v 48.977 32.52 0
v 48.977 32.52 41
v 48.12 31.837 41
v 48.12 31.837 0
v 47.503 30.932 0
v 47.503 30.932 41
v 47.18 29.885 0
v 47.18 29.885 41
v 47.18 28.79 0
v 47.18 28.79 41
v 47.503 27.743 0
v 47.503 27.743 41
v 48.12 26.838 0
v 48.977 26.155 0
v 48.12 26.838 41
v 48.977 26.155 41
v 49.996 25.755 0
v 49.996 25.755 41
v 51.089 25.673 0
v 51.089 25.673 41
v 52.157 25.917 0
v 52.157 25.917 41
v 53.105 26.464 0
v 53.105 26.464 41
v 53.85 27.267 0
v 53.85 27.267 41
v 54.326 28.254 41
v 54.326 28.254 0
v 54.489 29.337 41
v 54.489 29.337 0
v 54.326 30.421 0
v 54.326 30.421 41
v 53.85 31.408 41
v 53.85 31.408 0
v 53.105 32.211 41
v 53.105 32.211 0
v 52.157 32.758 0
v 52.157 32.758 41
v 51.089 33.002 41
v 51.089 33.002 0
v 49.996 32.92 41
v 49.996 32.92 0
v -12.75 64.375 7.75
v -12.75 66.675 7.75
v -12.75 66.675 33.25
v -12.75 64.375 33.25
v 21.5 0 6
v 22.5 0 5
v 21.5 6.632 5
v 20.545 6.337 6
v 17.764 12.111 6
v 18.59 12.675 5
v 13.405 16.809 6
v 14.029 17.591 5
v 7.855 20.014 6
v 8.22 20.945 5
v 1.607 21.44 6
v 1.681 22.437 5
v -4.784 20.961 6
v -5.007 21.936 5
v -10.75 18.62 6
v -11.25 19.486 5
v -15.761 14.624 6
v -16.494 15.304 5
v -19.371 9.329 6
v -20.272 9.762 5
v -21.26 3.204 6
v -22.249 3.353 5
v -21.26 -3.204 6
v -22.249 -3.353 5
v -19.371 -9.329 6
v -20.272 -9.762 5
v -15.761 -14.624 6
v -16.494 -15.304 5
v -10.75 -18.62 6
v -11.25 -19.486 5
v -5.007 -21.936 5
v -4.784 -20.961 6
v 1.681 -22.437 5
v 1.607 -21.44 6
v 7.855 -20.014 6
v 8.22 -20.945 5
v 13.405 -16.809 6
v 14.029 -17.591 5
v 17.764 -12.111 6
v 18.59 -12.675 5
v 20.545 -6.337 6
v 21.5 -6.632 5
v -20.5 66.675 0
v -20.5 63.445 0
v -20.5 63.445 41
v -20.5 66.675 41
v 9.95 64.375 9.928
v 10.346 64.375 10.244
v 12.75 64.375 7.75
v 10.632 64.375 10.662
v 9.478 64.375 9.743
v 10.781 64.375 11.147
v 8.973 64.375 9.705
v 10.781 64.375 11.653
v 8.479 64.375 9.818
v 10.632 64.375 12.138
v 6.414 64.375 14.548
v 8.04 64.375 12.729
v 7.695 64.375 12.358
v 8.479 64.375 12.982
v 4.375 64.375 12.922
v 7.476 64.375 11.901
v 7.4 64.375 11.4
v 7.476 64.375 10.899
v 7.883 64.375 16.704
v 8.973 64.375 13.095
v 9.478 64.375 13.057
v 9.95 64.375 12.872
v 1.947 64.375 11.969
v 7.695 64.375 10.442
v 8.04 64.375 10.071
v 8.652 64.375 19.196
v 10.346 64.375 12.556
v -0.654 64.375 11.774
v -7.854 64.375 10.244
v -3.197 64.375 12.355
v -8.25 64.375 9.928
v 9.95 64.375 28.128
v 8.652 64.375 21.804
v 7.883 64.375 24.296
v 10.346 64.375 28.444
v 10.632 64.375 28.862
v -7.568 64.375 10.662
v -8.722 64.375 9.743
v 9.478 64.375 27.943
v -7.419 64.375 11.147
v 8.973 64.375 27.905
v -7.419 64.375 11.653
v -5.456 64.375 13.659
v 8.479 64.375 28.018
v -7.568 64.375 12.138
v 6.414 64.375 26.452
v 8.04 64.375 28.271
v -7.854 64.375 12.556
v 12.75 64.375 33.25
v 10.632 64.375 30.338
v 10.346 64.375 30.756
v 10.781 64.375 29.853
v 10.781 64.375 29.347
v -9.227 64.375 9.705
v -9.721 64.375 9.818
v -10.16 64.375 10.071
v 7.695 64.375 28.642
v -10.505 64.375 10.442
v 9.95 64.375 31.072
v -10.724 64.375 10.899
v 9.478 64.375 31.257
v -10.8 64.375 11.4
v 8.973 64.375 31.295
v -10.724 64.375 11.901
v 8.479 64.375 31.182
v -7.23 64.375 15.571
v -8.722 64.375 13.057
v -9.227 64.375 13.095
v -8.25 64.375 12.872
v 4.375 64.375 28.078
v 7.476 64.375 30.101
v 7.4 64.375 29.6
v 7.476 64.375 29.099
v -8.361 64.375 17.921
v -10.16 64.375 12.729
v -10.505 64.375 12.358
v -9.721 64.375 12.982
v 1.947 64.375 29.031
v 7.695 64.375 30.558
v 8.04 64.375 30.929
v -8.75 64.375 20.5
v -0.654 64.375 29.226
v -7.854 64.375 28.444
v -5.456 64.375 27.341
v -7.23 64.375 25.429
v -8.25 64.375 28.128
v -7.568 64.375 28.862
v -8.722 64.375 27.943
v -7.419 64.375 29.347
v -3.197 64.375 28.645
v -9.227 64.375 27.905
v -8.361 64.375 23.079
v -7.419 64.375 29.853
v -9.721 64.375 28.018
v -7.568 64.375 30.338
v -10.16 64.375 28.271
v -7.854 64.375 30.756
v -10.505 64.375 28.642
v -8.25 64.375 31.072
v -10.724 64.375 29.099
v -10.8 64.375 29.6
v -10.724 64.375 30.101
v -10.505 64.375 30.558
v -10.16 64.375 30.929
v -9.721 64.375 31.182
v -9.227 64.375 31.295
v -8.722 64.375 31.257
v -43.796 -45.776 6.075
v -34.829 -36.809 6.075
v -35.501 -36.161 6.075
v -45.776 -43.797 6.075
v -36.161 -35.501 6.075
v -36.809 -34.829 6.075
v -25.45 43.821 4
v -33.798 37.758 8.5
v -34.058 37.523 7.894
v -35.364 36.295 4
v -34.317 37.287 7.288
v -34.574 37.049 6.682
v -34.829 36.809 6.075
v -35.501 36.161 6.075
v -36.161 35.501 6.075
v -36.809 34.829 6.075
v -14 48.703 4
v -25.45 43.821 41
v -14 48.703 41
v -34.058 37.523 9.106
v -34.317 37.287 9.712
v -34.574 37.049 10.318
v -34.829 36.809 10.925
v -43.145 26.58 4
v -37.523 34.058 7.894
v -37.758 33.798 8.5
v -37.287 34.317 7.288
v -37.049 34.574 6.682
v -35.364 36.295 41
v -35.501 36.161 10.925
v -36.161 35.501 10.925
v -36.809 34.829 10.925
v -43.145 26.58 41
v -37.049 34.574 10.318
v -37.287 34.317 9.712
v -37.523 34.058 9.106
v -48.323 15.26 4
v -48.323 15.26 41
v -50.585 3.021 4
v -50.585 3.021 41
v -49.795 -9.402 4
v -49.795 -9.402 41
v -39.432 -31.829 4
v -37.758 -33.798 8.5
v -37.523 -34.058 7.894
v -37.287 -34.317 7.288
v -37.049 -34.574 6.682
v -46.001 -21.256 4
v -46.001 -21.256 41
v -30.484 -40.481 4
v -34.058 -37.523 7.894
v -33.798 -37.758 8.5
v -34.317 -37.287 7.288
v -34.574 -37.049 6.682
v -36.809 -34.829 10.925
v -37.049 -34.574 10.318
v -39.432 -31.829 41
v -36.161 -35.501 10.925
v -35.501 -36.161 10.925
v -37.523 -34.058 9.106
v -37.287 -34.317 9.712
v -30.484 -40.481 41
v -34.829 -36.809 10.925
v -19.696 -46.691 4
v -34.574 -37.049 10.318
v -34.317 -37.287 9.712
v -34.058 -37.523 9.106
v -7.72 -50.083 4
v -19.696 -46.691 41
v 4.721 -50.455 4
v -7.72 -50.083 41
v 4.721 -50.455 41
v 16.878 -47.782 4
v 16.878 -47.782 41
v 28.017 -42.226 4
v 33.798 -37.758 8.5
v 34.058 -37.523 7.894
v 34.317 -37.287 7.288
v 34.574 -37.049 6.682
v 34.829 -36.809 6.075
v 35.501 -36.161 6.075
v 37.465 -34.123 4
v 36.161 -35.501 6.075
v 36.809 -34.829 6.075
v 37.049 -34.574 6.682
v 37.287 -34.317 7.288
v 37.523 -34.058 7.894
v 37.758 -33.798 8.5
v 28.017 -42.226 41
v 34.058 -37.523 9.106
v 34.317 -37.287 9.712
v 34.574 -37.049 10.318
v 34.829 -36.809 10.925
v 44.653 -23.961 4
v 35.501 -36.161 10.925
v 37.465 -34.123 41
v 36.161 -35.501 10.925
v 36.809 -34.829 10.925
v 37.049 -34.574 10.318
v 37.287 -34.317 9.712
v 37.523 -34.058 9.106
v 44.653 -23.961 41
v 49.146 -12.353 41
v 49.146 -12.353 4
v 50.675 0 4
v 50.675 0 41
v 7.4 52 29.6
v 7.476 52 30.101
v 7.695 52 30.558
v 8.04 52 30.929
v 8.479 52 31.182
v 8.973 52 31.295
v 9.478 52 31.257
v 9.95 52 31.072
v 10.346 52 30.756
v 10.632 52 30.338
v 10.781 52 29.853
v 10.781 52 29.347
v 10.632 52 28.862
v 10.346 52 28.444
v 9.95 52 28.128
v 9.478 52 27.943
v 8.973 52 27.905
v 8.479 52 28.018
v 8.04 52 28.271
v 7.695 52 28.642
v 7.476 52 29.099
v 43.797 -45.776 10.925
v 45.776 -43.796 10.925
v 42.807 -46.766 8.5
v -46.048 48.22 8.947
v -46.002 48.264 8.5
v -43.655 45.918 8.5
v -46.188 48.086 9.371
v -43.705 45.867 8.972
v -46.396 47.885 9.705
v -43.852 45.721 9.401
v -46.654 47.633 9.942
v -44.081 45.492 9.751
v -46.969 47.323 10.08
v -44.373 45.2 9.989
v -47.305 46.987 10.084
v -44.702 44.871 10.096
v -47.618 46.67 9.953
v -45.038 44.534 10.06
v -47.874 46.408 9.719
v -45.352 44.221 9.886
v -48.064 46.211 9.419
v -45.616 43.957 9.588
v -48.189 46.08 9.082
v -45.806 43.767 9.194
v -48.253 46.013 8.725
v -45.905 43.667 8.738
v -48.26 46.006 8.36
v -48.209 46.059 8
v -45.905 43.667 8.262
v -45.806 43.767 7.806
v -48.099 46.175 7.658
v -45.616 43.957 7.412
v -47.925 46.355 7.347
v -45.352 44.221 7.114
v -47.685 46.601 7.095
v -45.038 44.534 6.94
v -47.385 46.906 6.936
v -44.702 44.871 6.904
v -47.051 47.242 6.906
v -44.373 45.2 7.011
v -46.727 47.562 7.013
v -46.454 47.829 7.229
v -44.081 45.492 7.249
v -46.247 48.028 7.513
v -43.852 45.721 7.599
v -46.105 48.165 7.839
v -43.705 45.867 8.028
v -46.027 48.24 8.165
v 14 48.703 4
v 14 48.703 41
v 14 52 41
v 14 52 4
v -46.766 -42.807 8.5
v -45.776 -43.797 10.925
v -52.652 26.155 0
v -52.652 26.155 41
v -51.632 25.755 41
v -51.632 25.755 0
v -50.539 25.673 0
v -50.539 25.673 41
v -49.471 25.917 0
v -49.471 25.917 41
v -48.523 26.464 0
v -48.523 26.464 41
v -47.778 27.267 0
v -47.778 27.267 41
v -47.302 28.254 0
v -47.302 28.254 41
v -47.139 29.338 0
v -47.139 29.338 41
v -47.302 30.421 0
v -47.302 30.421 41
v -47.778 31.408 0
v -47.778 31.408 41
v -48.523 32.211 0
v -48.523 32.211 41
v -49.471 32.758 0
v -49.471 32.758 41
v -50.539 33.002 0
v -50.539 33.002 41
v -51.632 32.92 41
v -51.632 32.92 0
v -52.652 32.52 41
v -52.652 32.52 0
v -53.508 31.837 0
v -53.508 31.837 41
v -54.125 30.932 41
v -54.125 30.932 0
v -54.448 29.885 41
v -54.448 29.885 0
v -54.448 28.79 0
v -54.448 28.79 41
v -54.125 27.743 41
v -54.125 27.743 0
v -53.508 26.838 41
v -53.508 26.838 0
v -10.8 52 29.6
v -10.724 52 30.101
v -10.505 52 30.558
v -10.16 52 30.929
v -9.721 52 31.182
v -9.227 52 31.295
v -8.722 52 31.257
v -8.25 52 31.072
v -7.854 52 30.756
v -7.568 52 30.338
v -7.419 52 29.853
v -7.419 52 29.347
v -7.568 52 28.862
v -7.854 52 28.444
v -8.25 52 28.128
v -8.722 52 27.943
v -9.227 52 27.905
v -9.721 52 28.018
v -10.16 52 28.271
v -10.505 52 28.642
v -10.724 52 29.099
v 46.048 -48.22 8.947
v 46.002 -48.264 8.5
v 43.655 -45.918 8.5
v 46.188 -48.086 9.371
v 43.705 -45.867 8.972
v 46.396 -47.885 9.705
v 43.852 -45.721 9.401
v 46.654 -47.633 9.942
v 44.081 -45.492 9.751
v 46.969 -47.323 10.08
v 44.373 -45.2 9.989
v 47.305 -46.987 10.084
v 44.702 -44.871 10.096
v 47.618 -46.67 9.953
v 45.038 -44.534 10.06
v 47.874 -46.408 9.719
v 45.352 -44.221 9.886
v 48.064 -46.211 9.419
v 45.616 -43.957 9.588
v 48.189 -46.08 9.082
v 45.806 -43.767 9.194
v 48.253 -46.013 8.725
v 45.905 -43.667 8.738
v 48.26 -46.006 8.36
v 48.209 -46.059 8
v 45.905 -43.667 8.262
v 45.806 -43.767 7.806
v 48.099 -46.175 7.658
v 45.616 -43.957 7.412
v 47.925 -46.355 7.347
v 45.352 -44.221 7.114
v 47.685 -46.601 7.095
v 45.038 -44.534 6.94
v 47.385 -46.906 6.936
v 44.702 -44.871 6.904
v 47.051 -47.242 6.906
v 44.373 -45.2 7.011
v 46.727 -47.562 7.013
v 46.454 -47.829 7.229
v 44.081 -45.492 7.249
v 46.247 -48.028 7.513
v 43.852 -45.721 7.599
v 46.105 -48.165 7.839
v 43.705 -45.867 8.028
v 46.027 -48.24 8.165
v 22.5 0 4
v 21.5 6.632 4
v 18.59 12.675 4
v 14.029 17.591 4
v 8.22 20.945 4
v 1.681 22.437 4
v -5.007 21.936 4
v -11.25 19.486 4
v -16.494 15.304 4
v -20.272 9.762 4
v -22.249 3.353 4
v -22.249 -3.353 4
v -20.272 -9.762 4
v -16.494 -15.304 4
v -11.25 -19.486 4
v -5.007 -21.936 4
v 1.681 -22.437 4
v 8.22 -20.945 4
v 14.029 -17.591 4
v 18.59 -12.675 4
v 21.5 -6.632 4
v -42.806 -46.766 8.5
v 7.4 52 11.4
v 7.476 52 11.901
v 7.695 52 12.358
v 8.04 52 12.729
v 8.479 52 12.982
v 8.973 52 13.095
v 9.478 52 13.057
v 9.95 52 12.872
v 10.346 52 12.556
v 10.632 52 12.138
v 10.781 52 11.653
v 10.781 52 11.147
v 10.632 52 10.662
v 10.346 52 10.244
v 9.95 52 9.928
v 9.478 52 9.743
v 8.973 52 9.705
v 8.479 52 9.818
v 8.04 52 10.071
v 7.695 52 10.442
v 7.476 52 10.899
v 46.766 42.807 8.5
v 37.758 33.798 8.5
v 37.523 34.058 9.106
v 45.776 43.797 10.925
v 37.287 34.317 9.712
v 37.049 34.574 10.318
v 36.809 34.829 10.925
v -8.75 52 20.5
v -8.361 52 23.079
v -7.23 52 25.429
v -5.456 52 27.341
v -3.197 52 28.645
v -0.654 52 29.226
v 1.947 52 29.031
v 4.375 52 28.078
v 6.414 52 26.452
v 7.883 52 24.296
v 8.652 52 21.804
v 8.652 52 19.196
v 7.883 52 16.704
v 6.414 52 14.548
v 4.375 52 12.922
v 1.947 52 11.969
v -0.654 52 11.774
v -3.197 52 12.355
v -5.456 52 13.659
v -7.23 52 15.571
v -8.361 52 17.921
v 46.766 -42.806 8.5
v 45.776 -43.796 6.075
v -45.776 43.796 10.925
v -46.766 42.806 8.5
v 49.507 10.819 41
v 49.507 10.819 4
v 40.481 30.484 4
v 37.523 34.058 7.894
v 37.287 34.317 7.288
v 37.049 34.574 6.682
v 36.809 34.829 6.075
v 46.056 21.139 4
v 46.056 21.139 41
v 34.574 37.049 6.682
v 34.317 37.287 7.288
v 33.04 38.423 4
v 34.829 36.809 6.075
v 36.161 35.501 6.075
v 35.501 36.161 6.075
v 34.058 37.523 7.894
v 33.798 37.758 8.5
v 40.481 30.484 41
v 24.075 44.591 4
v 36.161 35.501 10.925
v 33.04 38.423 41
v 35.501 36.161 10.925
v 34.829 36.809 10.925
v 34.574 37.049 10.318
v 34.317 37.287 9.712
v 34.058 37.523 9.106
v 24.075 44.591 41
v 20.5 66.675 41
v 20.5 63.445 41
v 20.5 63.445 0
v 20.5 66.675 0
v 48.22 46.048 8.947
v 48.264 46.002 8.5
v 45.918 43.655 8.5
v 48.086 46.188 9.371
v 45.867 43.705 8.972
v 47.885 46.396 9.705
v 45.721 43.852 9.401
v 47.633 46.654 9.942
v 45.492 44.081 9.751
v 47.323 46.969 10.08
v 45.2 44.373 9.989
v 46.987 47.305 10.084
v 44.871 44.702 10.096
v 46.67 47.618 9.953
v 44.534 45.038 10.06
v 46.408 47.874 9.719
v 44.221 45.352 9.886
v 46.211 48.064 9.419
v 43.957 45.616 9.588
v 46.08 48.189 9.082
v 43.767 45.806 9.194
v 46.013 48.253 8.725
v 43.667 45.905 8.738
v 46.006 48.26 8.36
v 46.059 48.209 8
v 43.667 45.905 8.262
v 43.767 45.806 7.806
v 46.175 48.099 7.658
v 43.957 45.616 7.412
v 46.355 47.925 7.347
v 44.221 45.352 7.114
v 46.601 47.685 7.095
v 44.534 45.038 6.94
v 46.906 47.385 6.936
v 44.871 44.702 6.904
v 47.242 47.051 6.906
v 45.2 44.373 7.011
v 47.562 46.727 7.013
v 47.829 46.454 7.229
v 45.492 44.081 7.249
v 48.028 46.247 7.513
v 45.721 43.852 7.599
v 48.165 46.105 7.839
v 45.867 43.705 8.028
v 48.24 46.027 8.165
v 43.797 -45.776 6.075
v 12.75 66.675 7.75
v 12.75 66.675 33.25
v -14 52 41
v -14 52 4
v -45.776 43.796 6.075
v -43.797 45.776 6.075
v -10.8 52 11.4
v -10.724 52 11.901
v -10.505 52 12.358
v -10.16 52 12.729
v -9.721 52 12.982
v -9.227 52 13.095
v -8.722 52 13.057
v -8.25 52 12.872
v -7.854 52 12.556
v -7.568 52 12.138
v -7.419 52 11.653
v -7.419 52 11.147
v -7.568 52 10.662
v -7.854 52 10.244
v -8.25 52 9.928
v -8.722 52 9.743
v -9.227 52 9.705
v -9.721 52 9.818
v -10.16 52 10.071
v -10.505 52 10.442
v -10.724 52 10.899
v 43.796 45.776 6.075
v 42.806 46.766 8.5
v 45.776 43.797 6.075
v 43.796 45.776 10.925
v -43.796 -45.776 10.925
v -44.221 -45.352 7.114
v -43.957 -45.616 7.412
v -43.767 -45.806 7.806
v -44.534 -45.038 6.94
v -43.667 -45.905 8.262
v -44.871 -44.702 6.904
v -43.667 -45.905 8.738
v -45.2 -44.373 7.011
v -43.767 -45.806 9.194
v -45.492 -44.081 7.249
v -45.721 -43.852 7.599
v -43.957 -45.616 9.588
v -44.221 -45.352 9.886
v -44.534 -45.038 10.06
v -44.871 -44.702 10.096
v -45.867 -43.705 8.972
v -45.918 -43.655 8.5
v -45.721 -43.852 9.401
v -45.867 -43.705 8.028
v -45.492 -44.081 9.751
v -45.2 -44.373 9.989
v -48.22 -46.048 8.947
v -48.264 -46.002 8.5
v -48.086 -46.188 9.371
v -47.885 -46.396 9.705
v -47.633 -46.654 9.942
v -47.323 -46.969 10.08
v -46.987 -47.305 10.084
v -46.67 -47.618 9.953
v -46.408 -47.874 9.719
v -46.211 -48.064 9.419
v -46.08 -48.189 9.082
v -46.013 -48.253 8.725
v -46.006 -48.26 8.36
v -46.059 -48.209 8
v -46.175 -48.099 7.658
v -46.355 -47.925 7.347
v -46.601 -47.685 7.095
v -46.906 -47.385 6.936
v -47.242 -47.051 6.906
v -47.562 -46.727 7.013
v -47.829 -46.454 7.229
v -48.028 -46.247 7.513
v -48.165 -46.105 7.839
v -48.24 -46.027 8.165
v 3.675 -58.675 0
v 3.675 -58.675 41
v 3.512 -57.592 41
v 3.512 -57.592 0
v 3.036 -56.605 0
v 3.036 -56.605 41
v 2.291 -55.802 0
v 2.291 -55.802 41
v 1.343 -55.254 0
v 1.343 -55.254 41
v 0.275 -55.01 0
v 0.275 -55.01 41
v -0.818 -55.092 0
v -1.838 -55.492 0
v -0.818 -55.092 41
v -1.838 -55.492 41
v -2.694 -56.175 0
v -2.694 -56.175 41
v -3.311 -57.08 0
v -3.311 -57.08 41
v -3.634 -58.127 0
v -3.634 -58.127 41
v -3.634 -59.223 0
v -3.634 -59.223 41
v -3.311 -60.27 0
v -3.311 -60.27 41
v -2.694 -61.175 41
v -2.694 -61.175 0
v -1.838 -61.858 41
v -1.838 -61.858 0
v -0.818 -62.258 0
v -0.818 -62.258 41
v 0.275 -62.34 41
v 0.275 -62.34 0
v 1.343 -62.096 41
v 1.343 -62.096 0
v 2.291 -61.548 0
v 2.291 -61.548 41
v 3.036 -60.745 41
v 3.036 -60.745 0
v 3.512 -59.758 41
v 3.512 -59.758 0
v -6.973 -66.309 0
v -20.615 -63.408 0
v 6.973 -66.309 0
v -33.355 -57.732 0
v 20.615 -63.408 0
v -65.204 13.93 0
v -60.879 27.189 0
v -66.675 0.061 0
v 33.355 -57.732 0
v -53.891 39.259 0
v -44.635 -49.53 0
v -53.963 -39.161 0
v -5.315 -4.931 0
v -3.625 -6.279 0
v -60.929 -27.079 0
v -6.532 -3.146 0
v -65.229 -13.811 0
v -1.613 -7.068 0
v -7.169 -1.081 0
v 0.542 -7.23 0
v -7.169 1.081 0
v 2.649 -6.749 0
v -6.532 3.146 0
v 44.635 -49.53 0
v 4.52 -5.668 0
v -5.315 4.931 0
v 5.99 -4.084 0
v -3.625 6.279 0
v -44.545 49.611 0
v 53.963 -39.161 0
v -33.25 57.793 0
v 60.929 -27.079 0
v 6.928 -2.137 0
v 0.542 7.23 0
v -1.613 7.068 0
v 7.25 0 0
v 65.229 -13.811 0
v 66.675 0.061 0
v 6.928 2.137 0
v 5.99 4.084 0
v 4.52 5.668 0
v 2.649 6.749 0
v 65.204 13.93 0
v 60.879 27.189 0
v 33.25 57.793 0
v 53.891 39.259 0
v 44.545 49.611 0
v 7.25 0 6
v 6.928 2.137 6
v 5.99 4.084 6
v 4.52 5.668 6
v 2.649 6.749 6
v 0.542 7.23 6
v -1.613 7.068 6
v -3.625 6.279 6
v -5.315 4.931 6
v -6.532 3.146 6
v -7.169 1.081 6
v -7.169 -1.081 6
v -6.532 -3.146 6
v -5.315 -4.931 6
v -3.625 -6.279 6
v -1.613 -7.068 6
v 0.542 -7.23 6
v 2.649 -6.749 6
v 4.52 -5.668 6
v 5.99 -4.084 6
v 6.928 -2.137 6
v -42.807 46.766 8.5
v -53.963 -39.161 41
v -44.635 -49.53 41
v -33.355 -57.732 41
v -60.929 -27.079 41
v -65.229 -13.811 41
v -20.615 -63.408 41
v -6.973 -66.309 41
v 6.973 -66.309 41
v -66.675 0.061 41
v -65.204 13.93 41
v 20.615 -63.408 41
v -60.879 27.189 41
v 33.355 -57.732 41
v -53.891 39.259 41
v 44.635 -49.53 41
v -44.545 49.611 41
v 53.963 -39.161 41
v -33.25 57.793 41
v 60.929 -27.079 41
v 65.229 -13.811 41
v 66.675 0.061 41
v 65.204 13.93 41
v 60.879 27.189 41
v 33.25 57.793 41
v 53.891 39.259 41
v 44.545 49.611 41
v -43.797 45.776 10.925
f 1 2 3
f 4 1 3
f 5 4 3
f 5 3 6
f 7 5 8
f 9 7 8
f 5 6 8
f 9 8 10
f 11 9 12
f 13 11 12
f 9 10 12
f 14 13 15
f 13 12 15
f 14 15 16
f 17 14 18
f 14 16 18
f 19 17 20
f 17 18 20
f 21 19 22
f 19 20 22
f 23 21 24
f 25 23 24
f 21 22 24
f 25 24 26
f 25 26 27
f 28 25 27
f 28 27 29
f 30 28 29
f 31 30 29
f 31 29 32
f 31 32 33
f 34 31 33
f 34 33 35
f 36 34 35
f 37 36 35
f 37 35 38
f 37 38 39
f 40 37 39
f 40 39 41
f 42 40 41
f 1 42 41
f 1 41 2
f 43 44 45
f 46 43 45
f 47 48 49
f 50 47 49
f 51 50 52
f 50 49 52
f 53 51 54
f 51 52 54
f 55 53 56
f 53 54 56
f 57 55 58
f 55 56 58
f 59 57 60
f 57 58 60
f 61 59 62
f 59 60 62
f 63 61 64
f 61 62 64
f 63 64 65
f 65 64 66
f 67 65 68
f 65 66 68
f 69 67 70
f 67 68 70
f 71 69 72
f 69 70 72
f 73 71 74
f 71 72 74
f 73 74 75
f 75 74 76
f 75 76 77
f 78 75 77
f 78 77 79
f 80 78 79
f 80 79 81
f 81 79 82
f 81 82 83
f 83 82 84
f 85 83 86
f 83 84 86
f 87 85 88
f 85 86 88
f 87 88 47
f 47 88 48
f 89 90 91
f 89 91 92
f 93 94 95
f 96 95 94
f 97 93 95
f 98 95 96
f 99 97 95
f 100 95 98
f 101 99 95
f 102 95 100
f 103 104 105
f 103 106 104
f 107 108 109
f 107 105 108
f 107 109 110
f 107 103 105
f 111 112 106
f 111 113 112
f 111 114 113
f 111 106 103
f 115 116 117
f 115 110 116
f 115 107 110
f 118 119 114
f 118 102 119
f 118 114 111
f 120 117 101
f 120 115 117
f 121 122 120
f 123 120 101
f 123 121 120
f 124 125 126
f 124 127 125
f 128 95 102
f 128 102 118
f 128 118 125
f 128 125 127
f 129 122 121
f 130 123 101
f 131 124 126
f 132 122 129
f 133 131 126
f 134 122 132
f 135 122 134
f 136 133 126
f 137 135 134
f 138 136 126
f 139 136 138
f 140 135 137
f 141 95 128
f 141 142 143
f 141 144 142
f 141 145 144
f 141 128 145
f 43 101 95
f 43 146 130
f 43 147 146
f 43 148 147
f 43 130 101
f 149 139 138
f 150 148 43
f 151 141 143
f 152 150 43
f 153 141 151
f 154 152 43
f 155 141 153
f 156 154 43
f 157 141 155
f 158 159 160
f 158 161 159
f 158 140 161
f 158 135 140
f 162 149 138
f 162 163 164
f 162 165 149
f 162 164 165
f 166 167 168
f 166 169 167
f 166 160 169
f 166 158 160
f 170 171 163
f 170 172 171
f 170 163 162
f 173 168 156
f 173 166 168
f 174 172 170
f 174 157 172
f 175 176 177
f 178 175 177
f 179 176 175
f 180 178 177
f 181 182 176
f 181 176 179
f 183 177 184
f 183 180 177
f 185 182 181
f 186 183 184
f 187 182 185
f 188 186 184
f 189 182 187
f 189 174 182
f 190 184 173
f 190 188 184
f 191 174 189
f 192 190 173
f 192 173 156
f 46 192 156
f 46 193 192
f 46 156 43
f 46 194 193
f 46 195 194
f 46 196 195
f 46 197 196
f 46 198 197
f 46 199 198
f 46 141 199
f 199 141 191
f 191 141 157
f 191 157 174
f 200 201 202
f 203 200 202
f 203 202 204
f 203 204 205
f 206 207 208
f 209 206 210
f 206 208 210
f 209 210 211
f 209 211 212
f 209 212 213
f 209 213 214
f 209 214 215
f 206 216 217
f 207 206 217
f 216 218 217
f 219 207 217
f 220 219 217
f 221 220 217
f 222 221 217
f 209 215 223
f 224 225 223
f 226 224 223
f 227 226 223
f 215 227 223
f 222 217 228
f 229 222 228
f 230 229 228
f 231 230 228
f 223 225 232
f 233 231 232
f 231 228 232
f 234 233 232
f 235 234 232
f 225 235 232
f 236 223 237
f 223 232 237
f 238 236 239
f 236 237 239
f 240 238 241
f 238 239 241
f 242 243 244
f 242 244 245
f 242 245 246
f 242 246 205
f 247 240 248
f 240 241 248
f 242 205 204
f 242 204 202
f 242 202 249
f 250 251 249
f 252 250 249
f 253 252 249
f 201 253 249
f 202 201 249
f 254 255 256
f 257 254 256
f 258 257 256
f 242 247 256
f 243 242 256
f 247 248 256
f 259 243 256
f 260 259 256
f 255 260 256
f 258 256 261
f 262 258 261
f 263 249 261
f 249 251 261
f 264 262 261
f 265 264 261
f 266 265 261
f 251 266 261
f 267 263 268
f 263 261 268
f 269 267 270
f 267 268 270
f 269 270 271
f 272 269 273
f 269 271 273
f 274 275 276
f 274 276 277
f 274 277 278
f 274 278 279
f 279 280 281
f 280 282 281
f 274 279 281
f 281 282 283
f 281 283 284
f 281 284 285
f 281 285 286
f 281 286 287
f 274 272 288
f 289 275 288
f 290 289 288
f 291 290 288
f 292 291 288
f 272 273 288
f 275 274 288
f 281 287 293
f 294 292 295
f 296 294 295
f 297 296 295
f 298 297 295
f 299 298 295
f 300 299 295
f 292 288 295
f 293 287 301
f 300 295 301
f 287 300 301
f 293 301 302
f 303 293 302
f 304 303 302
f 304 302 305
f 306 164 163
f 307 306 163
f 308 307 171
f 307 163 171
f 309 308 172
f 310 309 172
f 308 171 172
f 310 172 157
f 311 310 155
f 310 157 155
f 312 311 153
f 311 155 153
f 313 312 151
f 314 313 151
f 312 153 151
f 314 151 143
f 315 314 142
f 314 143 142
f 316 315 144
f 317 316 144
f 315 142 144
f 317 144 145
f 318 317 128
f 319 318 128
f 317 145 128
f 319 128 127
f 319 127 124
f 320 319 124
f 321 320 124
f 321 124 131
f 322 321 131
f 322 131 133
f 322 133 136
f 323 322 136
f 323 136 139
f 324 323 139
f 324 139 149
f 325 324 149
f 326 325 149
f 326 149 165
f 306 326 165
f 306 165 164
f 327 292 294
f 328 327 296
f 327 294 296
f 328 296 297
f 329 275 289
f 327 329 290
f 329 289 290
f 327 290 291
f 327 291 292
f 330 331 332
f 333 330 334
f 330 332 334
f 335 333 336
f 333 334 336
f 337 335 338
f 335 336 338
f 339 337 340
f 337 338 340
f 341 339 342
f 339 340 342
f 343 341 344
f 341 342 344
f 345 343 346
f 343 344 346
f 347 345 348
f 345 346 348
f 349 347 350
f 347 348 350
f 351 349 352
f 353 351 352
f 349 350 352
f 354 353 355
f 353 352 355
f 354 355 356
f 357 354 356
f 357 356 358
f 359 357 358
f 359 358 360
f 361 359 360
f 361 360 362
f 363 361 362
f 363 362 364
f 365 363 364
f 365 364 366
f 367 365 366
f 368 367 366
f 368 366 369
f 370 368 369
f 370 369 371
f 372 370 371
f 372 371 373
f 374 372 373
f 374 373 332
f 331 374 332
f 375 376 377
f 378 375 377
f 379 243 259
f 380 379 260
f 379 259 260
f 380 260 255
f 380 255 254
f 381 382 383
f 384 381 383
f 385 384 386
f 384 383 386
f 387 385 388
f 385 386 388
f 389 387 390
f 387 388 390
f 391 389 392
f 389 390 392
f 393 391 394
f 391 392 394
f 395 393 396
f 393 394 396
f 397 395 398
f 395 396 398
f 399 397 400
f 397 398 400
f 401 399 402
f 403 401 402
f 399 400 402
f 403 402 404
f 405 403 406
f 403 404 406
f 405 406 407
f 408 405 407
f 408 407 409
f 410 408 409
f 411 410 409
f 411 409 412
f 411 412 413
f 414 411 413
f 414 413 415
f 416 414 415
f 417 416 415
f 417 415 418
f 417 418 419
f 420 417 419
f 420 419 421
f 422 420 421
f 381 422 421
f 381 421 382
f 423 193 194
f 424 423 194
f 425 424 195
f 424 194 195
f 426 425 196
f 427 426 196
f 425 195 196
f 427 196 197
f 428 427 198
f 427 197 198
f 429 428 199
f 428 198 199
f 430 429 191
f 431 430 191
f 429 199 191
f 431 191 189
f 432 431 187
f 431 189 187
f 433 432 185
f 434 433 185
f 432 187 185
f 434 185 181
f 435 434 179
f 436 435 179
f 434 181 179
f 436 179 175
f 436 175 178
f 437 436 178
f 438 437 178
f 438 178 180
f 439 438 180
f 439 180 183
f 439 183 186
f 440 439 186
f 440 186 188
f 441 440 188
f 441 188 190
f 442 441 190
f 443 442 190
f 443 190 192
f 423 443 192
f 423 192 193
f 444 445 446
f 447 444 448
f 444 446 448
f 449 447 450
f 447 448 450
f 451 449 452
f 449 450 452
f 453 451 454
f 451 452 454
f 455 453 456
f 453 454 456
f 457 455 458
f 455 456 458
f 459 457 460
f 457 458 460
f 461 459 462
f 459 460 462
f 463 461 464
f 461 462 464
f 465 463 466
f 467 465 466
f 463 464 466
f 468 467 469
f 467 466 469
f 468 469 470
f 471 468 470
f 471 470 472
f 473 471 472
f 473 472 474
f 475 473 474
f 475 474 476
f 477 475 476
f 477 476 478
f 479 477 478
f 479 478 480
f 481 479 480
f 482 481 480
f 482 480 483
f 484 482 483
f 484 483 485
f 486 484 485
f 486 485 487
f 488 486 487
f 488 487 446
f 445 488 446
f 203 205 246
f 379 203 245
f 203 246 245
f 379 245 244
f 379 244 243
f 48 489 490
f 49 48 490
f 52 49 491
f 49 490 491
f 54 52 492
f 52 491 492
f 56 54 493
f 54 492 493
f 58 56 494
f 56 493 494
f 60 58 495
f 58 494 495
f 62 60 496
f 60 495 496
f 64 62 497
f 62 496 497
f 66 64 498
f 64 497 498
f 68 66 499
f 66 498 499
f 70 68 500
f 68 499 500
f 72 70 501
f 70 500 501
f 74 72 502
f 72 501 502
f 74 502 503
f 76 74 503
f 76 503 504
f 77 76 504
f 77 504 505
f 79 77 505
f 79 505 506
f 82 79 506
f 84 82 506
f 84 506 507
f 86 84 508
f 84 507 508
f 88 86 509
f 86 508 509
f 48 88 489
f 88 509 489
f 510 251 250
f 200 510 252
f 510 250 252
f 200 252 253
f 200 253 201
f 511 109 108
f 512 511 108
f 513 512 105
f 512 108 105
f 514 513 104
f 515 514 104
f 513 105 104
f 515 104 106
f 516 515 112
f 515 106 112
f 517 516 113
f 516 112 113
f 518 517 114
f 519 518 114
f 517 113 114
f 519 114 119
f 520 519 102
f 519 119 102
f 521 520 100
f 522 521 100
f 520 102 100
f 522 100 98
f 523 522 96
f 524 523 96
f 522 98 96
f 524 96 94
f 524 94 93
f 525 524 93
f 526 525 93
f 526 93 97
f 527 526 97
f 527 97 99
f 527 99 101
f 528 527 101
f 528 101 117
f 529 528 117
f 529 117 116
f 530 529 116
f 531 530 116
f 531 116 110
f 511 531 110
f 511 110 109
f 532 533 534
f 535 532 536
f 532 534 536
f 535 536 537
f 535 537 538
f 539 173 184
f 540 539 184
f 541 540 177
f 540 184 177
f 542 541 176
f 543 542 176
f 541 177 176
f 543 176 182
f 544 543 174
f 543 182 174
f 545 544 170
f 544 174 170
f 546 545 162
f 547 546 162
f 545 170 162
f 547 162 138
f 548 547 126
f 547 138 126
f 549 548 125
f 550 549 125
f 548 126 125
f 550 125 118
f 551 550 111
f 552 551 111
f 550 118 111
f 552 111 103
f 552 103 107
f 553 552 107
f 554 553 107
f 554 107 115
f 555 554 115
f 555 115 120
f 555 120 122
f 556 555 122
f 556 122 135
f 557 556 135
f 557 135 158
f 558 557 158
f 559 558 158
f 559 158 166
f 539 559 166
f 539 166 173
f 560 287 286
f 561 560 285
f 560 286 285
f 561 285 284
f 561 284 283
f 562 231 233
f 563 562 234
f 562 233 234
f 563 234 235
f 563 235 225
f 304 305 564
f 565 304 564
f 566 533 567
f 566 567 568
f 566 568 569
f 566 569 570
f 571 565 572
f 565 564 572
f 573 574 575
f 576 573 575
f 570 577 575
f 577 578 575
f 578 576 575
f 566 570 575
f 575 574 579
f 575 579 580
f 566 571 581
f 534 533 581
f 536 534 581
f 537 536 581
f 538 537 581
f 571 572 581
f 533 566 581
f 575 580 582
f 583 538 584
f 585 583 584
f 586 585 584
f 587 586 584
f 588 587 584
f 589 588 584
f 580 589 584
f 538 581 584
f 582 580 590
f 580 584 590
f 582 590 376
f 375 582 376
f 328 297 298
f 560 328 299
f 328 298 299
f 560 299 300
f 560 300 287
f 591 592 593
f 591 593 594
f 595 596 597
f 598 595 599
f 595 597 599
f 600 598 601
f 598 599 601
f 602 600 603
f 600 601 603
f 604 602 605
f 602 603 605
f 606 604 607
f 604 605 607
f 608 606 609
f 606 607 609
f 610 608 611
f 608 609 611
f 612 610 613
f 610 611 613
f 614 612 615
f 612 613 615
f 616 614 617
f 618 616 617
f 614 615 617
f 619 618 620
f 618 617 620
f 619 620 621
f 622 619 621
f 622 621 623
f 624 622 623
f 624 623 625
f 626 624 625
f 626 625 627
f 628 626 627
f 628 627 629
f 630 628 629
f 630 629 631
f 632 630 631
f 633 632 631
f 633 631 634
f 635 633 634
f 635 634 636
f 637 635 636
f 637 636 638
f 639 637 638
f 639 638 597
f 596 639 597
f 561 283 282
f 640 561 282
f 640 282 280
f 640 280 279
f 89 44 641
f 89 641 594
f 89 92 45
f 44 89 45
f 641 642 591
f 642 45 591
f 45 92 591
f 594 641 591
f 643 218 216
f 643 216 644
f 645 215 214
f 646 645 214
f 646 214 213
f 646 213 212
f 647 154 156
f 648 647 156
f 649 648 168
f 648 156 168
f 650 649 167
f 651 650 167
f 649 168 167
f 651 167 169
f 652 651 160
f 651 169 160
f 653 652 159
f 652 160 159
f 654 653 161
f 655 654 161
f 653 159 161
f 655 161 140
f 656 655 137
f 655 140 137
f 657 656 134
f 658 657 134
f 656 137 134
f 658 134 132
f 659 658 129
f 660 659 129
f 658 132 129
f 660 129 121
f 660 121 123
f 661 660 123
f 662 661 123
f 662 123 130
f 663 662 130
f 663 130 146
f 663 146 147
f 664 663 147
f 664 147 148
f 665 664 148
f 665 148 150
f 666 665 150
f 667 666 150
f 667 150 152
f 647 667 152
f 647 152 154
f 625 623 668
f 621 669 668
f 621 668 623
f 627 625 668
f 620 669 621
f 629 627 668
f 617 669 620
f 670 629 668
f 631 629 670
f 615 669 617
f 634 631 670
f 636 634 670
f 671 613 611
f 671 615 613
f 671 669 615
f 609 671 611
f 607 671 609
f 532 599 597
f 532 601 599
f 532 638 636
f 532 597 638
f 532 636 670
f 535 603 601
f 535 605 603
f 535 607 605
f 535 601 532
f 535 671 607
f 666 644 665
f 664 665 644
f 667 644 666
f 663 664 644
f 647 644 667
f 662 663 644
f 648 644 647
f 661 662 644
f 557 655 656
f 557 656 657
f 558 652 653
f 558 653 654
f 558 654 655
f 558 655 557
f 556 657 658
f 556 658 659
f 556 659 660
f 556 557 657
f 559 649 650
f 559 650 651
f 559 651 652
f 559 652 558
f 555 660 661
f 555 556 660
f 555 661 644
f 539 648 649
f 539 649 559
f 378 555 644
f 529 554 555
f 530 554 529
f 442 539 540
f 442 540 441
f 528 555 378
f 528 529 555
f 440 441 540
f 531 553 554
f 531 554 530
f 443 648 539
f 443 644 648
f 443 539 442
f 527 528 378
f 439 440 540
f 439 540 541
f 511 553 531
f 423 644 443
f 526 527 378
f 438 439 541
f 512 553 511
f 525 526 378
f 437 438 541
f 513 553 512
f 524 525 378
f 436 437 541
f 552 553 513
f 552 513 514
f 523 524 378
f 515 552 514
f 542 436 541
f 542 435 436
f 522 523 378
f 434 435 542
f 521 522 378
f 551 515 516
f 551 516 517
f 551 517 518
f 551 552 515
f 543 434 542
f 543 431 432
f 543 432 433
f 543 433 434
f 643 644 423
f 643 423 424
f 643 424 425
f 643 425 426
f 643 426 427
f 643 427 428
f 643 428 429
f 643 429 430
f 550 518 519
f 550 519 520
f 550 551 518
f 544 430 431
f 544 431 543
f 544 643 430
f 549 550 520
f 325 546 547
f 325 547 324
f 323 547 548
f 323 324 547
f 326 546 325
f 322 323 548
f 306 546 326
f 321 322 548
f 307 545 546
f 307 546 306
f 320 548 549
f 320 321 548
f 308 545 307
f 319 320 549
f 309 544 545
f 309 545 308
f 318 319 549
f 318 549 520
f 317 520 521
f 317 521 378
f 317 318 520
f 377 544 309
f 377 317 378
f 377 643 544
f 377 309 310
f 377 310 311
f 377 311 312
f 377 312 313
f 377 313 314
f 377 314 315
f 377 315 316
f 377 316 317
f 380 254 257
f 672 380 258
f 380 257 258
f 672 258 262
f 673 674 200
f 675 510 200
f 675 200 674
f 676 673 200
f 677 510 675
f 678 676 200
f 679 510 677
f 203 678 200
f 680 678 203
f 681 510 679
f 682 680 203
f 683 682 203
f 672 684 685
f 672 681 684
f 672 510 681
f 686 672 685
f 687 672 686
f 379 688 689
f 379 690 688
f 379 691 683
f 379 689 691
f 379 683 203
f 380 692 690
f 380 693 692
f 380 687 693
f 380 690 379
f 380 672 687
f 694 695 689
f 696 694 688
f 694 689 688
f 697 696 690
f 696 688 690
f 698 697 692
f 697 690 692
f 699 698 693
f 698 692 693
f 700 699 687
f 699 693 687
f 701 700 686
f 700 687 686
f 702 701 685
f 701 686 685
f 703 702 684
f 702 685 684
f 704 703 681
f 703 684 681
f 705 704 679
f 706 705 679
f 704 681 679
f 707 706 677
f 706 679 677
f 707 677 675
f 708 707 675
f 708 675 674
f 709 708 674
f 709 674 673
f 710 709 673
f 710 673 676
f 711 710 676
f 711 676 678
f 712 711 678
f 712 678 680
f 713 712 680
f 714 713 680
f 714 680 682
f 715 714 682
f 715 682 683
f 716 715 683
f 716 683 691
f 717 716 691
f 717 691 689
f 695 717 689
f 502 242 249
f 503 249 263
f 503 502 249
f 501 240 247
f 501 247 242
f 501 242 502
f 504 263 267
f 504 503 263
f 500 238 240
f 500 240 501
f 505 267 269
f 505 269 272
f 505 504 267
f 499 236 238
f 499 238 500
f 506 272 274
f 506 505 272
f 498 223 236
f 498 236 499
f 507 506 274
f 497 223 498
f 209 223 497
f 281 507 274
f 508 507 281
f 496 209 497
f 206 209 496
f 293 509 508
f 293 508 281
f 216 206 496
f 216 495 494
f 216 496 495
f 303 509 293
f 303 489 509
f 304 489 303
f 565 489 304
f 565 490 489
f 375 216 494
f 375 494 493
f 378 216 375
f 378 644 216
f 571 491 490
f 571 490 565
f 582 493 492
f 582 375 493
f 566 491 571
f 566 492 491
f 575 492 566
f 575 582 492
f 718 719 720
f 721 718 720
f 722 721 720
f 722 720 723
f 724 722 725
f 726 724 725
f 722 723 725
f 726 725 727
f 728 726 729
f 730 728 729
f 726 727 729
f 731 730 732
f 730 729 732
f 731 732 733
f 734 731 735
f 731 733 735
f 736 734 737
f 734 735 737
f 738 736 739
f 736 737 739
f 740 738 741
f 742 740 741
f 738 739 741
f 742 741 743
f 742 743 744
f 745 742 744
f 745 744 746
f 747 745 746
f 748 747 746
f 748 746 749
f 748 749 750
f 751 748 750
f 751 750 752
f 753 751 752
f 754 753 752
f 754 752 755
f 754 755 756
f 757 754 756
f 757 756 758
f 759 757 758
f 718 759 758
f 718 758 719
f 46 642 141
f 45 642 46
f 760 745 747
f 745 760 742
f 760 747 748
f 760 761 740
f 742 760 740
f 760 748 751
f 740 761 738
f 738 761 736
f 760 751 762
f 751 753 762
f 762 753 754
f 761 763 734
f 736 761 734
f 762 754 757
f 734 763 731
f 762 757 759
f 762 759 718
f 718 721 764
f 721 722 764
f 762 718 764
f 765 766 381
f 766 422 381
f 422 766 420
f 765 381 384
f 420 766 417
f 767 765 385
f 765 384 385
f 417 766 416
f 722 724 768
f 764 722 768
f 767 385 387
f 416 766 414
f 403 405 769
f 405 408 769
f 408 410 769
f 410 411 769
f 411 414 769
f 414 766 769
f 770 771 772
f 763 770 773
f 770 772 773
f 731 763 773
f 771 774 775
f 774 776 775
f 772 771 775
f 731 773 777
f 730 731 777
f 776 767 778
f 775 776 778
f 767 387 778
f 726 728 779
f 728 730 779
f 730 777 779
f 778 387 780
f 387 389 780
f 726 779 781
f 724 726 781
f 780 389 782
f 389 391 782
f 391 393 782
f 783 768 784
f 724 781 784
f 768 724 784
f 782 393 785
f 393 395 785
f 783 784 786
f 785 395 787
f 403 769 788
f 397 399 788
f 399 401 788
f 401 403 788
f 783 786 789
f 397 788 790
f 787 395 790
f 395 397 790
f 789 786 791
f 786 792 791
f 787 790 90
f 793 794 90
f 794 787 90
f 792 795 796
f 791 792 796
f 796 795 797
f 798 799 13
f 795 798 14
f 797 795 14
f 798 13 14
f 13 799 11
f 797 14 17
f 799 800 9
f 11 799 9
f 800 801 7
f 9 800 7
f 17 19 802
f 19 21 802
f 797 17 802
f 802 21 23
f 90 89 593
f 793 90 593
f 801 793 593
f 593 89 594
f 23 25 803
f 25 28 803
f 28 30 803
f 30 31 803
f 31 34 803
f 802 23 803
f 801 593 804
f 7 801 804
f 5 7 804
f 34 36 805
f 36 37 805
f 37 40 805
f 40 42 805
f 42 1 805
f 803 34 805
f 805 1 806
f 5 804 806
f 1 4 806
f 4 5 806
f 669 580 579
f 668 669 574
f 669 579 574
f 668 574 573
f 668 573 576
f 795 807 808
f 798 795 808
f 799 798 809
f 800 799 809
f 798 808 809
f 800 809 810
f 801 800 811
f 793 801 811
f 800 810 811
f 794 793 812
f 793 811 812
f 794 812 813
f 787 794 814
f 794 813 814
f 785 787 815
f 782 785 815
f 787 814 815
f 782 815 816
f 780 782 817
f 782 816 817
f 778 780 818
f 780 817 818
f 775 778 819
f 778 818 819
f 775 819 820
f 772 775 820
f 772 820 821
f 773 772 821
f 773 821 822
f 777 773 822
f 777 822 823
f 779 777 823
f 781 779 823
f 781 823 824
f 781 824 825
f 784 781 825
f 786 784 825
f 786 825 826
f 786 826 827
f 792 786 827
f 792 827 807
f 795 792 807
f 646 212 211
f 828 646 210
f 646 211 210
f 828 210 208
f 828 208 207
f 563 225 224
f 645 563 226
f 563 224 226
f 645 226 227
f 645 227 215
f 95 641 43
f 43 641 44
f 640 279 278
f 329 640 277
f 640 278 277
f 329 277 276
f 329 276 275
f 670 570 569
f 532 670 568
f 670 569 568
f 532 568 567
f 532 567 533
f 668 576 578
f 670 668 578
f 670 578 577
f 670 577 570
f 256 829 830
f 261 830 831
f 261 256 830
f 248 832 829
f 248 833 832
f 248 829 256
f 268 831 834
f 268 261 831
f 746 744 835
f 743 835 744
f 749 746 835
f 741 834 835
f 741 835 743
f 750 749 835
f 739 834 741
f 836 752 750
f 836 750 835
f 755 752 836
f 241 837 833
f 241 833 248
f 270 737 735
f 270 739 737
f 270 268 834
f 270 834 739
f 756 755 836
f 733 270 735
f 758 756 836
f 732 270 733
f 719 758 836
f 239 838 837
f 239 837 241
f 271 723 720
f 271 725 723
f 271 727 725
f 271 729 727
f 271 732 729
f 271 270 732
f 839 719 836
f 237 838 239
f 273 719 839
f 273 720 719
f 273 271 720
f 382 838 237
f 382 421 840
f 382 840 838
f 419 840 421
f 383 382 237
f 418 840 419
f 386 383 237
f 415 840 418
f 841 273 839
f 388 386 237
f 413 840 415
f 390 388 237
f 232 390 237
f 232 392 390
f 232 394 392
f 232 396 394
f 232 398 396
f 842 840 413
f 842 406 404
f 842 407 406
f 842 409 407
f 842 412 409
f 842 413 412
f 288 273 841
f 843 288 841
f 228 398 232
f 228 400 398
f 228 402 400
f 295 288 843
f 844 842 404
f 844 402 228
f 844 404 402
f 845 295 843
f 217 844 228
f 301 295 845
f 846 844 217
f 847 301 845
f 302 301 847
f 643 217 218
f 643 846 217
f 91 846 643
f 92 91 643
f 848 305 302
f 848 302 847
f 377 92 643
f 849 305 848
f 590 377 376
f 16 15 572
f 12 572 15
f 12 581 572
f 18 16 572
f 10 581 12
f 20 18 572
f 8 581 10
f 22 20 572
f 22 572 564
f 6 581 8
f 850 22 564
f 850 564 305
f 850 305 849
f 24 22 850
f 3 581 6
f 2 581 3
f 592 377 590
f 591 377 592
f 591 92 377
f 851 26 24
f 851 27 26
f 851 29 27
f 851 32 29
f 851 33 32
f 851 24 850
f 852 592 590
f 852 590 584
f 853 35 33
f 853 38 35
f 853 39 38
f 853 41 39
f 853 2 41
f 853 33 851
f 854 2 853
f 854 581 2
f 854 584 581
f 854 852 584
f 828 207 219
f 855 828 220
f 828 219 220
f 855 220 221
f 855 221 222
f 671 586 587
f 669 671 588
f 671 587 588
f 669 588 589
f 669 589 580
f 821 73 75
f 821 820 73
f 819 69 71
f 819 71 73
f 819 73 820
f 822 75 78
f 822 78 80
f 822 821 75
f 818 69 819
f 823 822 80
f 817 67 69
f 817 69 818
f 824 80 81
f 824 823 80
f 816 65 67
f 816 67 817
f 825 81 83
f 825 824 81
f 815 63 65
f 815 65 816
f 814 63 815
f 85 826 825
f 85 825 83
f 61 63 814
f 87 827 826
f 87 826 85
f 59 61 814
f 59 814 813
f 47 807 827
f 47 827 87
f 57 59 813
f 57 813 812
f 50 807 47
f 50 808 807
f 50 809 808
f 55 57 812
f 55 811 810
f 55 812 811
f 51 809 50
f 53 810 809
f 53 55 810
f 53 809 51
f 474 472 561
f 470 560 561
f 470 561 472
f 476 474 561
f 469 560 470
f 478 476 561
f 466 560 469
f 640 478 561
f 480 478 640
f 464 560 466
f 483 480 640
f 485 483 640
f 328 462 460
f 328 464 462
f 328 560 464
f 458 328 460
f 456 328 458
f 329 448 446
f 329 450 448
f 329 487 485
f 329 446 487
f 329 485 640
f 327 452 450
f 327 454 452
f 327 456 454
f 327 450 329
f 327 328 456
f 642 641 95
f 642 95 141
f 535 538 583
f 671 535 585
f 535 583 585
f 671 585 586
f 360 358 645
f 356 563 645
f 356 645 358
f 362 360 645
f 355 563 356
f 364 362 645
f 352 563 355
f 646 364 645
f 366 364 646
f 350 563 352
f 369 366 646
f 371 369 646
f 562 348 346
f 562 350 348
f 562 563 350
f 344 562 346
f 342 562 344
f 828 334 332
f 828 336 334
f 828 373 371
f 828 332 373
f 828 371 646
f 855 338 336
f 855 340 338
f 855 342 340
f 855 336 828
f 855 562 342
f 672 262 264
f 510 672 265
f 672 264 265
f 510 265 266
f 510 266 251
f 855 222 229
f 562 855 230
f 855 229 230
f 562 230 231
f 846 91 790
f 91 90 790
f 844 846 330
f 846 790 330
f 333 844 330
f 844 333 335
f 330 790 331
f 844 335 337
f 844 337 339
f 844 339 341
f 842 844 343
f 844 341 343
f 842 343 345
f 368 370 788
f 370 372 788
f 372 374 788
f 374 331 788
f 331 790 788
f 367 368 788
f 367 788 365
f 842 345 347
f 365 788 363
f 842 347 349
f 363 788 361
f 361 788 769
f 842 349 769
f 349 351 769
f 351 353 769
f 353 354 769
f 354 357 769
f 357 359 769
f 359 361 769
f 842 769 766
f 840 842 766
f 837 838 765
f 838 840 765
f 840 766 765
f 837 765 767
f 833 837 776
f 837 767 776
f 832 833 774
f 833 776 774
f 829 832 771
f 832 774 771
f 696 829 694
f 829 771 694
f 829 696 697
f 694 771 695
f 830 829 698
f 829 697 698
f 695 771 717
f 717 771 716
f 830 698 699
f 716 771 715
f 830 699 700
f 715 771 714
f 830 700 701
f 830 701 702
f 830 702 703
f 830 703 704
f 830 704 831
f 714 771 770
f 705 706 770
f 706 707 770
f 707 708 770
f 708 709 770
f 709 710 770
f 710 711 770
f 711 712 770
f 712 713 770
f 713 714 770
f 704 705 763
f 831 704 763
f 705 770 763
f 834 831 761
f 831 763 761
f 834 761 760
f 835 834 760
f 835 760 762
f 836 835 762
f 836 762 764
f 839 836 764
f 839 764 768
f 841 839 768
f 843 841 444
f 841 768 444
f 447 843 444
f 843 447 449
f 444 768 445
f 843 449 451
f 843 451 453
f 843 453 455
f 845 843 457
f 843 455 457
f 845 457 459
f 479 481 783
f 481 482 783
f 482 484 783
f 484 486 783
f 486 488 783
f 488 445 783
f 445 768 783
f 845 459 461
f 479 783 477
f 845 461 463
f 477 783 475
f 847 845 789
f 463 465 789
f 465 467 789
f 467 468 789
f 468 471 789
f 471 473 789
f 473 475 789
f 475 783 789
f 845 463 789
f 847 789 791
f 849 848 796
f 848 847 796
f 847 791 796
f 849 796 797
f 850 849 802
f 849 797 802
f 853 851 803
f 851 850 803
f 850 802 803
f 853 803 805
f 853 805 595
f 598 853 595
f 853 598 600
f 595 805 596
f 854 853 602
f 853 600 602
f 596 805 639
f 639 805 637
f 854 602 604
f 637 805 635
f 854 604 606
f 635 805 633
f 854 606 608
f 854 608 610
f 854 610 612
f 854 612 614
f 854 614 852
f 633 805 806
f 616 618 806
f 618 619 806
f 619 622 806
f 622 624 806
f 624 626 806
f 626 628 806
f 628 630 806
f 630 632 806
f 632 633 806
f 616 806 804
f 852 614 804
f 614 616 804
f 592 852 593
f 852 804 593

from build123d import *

# Parameters (mm, degrees)
SKETCH031_R           = 66.675
PAD006_DEPTH          = 41
SKETCH032_W           = 41
SKETCH032_H           = 10
PAD007_DEPTH          = 41
SKETCH033_R           = 8.75
POCKET048_DEPTH       = 16
SKETCH034_W           = 25.5
SKETCH034_H           = 25.5
POCKET049_DEPTH       = 2.3
SKETCH035_R           = 1.7
POCKET050_DEPTH       = 16
POCKET051_DEPTH       = 37
SKETCH037_R           = 1.6
POCKET052_DEPTH       = 446.937769
POLARPATTERN017_COUNT = 4
POCKET053_DEPTH       = 30
POLARPATTERN018_COUNT = 4
SKETCH040_R           = 50.675
POCKET054_DEPTH       = 37
SKETCH041_R           = 3.675
POCKET055_DEPTH       = 426.98258
POLARPATTERN019_COUNT = 3
SKETCH042_R           = 22.5
PAD013_DEPTH          = 2
SKETCH044_R           = 7.25
POCKET056_DEPTH       = 6.001
SKETCH045_W           = 28
SKETCH045_H           = 10
POCKET057_DEPTH       = 37
CHAMFER008_SIZE       = 1


with BuildPart() as part:
    # Sketch031 → Pad006 (new body)
    with BuildSketch(Plane.XY):
        Circle(SKETCH031_R)
    extrude(amount=PAD006_DEPTH)

    # Sketch032 (on Face3 of Pad006) → Pad007 (join)
    with BuildSketch(Plane.XY.offset(41)):
        with Locations((0, 61.675)):
            Rectangle(SKETCH032_W, SKETCH032_H)
    extrude(amount=-PAD007_DEPTH)

    # Sketch033 (on Face8 of Pad007) → Pocket048 (cut)
    with BuildSketch(Plane(origin=(0, 66.675, 0), x_dir=(-1, 0, 0), z_dir=(0, 1, 0))):
        with Locations((0, 20.5)):
            Circle(SKETCH033_R)
    extrude(amount=-POCKET048_DEPTH, mode=Mode.SUBTRACT)

    # Sketch034 (on Face8 of Pocket048) → Pocket049 (cut)
    with BuildSketch(Plane(origin=(0, 66.675, 0), x_dir=(-1, 0, 0), z_dir=(0, 1, 0))):
        with Locations((0, 20.5)):
            Rectangle(SKETCH034_W, SKETCH034_H)
    extrude(amount=-POCKET049_DEPTH, mode=Mode.SUBTRACT)

    # Sketch035 (on Face19 of Pocket049) → Pocket050 (cut)
    with BuildSketch(Plane(origin=(0, 64.375, 0), x_dir=(-1, 0, 0), z_dir=(0, 1, 0))):
        with Locations((-9.1, 29.6)):
            Circle(SKETCH035_R)
        with Locations((9.1, 29.6)):
            Circle(SKETCH035_R)
        with Locations((9.1, 11.4)):
            Circle(SKETCH035_R)
        with Locations((-9.1, 11.4)):
            Circle(SKETCH035_R)
    extrude(amount=-POCKET050_DEPTH, mode=Mode.SUBTRACT)

    # Sketch036 → Pocket051 (cut)
    with BuildSketch(Plane.XY.offset(41)):
        Polygon((0, 47.1465), (-47.146189, 0), (0, -47.1465), (47.146189, 0), align=None)
    extrude(amount=-POCKET051_DEPTH, mode=Mode.SUBTRACT)

    # Sketch037 (on Face13 of Pocket051) → Pocket052 (cut, through all)
    with BuildSketch(Plane(origin=(23.57325, -23.573095, 0), x_dir=(-0.707104, -0.707109, 0), z_dir=(-0.707109, 0.707104, 0))):
        with Locations((0, 8.5)):
            Circle(SKETCH037_R)
    pocket052 = extrude(amount=-POCKET052_DEPTH, mode=Mode.SUBTRACT)

    # PolarPattern017: Pocket052 ×4 about axis
    polarpattern017_axis = Axis((0, 0, 0), (0, 0, 1))
    for i in range(1, POLARPATTERN017_COUNT):
        add(pocket052.rotate(polarpattern017_axis, i * 360 / POLARPATTERN017_COUNT), mode=Mode.SUBTRACT)

    # Sketch039 (on Face18 of PolarPattern017) → Pocket053 (cut)
    with BuildSketch(Plane(origin=(23.57325, -23.573095, 0), x_dir=(-0.707104, -0.707109, 0), z_dir=(-0.707109, 0.707104, 0))):
        Polygon((2.8, 8.5), (1.4, 10.924871), (-1.4, 10.924871), (-2.8, 8.5), (-1.4, 6.075129), (1.4, 6.075129), align=None)
    pocket053 = extrude(amount=-POCKET053_DEPTH, mode=Mode.SUBTRACT)

    # PolarPattern018: Pocket053 ×4 about axis
    polarpattern018_axis = Axis((0, 0, 0), (0, 0, 1))
    for i in range(1, POLARPATTERN018_COUNT):
        add(pocket053.rotate(polarpattern018_axis, i * 360 / POLARPATTERN018_COUNT), mode=Mode.SUBTRACT)

    # Sketch040 → Pocket054 (cut)
    with BuildSketch(Plane.XY.offset(41)):
        Circle(SKETCH040_R)
    extrude(amount=-POCKET054_DEPTH, mode=Mode.SUBTRACT)

    # Sketch041 → Pocket055 (cut, through all)
    with BuildSketch(Plane.XY.offset(41)):
        with Locations((0, -58.675)):
            Circle(SKETCH041_R)
    pocket055 = extrude(amount=-POCKET055_DEPTH, mode=Mode.SUBTRACT)

    # PolarPattern019: Pocket055 ×3 about axis
    polarpattern019_axis = Axis((0, 0, 41), (0, 0, 1))
    for i in range(1, POLARPATTERN019_COUNT):
        add(pocket055.rotate(polarpattern019_axis, i * 360 / POLARPATTERN019_COUNT), mode=Mode.SUBTRACT)

    # Sketch042 (on Face61 of PolarPattern019) → Pad013 (join)
    with BuildSketch(Plane.XY.offset(4)):
        Circle(SKETCH042_R)
    extrude(amount=PAD013_DEPTH)

    # Sketch044 (on Face66 of Pad013) → Pocket056 (cut, through all)
    with BuildSketch(Plane.XY.offset(6)):
        Circle(SKETCH044_R)
    extrude(amount=-POCKET056_DEPTH, mode=Mode.SUBTRACT)

    # Sketch045 (on Face5 of Pocket056) → Pocket057 (cut)
    with BuildSketch(Plane.XY.offset(41)):
        with Locations((0, 47)):
            Rectangle(SKETCH045_W, SKETCH045_H)
    extrude(amount=-POCKET057_DEPTH, mode=Mode.SUBTRACT)

    # Chamfer008
    chamfer008_edges = [part.edges().sort_by_distance(p)[0] for p in [
        (-22.5, 0, 6),
    ]]
    chamfer(chamfer008_edges, length=CHAMFER008_SIZE)


solid = part.part
